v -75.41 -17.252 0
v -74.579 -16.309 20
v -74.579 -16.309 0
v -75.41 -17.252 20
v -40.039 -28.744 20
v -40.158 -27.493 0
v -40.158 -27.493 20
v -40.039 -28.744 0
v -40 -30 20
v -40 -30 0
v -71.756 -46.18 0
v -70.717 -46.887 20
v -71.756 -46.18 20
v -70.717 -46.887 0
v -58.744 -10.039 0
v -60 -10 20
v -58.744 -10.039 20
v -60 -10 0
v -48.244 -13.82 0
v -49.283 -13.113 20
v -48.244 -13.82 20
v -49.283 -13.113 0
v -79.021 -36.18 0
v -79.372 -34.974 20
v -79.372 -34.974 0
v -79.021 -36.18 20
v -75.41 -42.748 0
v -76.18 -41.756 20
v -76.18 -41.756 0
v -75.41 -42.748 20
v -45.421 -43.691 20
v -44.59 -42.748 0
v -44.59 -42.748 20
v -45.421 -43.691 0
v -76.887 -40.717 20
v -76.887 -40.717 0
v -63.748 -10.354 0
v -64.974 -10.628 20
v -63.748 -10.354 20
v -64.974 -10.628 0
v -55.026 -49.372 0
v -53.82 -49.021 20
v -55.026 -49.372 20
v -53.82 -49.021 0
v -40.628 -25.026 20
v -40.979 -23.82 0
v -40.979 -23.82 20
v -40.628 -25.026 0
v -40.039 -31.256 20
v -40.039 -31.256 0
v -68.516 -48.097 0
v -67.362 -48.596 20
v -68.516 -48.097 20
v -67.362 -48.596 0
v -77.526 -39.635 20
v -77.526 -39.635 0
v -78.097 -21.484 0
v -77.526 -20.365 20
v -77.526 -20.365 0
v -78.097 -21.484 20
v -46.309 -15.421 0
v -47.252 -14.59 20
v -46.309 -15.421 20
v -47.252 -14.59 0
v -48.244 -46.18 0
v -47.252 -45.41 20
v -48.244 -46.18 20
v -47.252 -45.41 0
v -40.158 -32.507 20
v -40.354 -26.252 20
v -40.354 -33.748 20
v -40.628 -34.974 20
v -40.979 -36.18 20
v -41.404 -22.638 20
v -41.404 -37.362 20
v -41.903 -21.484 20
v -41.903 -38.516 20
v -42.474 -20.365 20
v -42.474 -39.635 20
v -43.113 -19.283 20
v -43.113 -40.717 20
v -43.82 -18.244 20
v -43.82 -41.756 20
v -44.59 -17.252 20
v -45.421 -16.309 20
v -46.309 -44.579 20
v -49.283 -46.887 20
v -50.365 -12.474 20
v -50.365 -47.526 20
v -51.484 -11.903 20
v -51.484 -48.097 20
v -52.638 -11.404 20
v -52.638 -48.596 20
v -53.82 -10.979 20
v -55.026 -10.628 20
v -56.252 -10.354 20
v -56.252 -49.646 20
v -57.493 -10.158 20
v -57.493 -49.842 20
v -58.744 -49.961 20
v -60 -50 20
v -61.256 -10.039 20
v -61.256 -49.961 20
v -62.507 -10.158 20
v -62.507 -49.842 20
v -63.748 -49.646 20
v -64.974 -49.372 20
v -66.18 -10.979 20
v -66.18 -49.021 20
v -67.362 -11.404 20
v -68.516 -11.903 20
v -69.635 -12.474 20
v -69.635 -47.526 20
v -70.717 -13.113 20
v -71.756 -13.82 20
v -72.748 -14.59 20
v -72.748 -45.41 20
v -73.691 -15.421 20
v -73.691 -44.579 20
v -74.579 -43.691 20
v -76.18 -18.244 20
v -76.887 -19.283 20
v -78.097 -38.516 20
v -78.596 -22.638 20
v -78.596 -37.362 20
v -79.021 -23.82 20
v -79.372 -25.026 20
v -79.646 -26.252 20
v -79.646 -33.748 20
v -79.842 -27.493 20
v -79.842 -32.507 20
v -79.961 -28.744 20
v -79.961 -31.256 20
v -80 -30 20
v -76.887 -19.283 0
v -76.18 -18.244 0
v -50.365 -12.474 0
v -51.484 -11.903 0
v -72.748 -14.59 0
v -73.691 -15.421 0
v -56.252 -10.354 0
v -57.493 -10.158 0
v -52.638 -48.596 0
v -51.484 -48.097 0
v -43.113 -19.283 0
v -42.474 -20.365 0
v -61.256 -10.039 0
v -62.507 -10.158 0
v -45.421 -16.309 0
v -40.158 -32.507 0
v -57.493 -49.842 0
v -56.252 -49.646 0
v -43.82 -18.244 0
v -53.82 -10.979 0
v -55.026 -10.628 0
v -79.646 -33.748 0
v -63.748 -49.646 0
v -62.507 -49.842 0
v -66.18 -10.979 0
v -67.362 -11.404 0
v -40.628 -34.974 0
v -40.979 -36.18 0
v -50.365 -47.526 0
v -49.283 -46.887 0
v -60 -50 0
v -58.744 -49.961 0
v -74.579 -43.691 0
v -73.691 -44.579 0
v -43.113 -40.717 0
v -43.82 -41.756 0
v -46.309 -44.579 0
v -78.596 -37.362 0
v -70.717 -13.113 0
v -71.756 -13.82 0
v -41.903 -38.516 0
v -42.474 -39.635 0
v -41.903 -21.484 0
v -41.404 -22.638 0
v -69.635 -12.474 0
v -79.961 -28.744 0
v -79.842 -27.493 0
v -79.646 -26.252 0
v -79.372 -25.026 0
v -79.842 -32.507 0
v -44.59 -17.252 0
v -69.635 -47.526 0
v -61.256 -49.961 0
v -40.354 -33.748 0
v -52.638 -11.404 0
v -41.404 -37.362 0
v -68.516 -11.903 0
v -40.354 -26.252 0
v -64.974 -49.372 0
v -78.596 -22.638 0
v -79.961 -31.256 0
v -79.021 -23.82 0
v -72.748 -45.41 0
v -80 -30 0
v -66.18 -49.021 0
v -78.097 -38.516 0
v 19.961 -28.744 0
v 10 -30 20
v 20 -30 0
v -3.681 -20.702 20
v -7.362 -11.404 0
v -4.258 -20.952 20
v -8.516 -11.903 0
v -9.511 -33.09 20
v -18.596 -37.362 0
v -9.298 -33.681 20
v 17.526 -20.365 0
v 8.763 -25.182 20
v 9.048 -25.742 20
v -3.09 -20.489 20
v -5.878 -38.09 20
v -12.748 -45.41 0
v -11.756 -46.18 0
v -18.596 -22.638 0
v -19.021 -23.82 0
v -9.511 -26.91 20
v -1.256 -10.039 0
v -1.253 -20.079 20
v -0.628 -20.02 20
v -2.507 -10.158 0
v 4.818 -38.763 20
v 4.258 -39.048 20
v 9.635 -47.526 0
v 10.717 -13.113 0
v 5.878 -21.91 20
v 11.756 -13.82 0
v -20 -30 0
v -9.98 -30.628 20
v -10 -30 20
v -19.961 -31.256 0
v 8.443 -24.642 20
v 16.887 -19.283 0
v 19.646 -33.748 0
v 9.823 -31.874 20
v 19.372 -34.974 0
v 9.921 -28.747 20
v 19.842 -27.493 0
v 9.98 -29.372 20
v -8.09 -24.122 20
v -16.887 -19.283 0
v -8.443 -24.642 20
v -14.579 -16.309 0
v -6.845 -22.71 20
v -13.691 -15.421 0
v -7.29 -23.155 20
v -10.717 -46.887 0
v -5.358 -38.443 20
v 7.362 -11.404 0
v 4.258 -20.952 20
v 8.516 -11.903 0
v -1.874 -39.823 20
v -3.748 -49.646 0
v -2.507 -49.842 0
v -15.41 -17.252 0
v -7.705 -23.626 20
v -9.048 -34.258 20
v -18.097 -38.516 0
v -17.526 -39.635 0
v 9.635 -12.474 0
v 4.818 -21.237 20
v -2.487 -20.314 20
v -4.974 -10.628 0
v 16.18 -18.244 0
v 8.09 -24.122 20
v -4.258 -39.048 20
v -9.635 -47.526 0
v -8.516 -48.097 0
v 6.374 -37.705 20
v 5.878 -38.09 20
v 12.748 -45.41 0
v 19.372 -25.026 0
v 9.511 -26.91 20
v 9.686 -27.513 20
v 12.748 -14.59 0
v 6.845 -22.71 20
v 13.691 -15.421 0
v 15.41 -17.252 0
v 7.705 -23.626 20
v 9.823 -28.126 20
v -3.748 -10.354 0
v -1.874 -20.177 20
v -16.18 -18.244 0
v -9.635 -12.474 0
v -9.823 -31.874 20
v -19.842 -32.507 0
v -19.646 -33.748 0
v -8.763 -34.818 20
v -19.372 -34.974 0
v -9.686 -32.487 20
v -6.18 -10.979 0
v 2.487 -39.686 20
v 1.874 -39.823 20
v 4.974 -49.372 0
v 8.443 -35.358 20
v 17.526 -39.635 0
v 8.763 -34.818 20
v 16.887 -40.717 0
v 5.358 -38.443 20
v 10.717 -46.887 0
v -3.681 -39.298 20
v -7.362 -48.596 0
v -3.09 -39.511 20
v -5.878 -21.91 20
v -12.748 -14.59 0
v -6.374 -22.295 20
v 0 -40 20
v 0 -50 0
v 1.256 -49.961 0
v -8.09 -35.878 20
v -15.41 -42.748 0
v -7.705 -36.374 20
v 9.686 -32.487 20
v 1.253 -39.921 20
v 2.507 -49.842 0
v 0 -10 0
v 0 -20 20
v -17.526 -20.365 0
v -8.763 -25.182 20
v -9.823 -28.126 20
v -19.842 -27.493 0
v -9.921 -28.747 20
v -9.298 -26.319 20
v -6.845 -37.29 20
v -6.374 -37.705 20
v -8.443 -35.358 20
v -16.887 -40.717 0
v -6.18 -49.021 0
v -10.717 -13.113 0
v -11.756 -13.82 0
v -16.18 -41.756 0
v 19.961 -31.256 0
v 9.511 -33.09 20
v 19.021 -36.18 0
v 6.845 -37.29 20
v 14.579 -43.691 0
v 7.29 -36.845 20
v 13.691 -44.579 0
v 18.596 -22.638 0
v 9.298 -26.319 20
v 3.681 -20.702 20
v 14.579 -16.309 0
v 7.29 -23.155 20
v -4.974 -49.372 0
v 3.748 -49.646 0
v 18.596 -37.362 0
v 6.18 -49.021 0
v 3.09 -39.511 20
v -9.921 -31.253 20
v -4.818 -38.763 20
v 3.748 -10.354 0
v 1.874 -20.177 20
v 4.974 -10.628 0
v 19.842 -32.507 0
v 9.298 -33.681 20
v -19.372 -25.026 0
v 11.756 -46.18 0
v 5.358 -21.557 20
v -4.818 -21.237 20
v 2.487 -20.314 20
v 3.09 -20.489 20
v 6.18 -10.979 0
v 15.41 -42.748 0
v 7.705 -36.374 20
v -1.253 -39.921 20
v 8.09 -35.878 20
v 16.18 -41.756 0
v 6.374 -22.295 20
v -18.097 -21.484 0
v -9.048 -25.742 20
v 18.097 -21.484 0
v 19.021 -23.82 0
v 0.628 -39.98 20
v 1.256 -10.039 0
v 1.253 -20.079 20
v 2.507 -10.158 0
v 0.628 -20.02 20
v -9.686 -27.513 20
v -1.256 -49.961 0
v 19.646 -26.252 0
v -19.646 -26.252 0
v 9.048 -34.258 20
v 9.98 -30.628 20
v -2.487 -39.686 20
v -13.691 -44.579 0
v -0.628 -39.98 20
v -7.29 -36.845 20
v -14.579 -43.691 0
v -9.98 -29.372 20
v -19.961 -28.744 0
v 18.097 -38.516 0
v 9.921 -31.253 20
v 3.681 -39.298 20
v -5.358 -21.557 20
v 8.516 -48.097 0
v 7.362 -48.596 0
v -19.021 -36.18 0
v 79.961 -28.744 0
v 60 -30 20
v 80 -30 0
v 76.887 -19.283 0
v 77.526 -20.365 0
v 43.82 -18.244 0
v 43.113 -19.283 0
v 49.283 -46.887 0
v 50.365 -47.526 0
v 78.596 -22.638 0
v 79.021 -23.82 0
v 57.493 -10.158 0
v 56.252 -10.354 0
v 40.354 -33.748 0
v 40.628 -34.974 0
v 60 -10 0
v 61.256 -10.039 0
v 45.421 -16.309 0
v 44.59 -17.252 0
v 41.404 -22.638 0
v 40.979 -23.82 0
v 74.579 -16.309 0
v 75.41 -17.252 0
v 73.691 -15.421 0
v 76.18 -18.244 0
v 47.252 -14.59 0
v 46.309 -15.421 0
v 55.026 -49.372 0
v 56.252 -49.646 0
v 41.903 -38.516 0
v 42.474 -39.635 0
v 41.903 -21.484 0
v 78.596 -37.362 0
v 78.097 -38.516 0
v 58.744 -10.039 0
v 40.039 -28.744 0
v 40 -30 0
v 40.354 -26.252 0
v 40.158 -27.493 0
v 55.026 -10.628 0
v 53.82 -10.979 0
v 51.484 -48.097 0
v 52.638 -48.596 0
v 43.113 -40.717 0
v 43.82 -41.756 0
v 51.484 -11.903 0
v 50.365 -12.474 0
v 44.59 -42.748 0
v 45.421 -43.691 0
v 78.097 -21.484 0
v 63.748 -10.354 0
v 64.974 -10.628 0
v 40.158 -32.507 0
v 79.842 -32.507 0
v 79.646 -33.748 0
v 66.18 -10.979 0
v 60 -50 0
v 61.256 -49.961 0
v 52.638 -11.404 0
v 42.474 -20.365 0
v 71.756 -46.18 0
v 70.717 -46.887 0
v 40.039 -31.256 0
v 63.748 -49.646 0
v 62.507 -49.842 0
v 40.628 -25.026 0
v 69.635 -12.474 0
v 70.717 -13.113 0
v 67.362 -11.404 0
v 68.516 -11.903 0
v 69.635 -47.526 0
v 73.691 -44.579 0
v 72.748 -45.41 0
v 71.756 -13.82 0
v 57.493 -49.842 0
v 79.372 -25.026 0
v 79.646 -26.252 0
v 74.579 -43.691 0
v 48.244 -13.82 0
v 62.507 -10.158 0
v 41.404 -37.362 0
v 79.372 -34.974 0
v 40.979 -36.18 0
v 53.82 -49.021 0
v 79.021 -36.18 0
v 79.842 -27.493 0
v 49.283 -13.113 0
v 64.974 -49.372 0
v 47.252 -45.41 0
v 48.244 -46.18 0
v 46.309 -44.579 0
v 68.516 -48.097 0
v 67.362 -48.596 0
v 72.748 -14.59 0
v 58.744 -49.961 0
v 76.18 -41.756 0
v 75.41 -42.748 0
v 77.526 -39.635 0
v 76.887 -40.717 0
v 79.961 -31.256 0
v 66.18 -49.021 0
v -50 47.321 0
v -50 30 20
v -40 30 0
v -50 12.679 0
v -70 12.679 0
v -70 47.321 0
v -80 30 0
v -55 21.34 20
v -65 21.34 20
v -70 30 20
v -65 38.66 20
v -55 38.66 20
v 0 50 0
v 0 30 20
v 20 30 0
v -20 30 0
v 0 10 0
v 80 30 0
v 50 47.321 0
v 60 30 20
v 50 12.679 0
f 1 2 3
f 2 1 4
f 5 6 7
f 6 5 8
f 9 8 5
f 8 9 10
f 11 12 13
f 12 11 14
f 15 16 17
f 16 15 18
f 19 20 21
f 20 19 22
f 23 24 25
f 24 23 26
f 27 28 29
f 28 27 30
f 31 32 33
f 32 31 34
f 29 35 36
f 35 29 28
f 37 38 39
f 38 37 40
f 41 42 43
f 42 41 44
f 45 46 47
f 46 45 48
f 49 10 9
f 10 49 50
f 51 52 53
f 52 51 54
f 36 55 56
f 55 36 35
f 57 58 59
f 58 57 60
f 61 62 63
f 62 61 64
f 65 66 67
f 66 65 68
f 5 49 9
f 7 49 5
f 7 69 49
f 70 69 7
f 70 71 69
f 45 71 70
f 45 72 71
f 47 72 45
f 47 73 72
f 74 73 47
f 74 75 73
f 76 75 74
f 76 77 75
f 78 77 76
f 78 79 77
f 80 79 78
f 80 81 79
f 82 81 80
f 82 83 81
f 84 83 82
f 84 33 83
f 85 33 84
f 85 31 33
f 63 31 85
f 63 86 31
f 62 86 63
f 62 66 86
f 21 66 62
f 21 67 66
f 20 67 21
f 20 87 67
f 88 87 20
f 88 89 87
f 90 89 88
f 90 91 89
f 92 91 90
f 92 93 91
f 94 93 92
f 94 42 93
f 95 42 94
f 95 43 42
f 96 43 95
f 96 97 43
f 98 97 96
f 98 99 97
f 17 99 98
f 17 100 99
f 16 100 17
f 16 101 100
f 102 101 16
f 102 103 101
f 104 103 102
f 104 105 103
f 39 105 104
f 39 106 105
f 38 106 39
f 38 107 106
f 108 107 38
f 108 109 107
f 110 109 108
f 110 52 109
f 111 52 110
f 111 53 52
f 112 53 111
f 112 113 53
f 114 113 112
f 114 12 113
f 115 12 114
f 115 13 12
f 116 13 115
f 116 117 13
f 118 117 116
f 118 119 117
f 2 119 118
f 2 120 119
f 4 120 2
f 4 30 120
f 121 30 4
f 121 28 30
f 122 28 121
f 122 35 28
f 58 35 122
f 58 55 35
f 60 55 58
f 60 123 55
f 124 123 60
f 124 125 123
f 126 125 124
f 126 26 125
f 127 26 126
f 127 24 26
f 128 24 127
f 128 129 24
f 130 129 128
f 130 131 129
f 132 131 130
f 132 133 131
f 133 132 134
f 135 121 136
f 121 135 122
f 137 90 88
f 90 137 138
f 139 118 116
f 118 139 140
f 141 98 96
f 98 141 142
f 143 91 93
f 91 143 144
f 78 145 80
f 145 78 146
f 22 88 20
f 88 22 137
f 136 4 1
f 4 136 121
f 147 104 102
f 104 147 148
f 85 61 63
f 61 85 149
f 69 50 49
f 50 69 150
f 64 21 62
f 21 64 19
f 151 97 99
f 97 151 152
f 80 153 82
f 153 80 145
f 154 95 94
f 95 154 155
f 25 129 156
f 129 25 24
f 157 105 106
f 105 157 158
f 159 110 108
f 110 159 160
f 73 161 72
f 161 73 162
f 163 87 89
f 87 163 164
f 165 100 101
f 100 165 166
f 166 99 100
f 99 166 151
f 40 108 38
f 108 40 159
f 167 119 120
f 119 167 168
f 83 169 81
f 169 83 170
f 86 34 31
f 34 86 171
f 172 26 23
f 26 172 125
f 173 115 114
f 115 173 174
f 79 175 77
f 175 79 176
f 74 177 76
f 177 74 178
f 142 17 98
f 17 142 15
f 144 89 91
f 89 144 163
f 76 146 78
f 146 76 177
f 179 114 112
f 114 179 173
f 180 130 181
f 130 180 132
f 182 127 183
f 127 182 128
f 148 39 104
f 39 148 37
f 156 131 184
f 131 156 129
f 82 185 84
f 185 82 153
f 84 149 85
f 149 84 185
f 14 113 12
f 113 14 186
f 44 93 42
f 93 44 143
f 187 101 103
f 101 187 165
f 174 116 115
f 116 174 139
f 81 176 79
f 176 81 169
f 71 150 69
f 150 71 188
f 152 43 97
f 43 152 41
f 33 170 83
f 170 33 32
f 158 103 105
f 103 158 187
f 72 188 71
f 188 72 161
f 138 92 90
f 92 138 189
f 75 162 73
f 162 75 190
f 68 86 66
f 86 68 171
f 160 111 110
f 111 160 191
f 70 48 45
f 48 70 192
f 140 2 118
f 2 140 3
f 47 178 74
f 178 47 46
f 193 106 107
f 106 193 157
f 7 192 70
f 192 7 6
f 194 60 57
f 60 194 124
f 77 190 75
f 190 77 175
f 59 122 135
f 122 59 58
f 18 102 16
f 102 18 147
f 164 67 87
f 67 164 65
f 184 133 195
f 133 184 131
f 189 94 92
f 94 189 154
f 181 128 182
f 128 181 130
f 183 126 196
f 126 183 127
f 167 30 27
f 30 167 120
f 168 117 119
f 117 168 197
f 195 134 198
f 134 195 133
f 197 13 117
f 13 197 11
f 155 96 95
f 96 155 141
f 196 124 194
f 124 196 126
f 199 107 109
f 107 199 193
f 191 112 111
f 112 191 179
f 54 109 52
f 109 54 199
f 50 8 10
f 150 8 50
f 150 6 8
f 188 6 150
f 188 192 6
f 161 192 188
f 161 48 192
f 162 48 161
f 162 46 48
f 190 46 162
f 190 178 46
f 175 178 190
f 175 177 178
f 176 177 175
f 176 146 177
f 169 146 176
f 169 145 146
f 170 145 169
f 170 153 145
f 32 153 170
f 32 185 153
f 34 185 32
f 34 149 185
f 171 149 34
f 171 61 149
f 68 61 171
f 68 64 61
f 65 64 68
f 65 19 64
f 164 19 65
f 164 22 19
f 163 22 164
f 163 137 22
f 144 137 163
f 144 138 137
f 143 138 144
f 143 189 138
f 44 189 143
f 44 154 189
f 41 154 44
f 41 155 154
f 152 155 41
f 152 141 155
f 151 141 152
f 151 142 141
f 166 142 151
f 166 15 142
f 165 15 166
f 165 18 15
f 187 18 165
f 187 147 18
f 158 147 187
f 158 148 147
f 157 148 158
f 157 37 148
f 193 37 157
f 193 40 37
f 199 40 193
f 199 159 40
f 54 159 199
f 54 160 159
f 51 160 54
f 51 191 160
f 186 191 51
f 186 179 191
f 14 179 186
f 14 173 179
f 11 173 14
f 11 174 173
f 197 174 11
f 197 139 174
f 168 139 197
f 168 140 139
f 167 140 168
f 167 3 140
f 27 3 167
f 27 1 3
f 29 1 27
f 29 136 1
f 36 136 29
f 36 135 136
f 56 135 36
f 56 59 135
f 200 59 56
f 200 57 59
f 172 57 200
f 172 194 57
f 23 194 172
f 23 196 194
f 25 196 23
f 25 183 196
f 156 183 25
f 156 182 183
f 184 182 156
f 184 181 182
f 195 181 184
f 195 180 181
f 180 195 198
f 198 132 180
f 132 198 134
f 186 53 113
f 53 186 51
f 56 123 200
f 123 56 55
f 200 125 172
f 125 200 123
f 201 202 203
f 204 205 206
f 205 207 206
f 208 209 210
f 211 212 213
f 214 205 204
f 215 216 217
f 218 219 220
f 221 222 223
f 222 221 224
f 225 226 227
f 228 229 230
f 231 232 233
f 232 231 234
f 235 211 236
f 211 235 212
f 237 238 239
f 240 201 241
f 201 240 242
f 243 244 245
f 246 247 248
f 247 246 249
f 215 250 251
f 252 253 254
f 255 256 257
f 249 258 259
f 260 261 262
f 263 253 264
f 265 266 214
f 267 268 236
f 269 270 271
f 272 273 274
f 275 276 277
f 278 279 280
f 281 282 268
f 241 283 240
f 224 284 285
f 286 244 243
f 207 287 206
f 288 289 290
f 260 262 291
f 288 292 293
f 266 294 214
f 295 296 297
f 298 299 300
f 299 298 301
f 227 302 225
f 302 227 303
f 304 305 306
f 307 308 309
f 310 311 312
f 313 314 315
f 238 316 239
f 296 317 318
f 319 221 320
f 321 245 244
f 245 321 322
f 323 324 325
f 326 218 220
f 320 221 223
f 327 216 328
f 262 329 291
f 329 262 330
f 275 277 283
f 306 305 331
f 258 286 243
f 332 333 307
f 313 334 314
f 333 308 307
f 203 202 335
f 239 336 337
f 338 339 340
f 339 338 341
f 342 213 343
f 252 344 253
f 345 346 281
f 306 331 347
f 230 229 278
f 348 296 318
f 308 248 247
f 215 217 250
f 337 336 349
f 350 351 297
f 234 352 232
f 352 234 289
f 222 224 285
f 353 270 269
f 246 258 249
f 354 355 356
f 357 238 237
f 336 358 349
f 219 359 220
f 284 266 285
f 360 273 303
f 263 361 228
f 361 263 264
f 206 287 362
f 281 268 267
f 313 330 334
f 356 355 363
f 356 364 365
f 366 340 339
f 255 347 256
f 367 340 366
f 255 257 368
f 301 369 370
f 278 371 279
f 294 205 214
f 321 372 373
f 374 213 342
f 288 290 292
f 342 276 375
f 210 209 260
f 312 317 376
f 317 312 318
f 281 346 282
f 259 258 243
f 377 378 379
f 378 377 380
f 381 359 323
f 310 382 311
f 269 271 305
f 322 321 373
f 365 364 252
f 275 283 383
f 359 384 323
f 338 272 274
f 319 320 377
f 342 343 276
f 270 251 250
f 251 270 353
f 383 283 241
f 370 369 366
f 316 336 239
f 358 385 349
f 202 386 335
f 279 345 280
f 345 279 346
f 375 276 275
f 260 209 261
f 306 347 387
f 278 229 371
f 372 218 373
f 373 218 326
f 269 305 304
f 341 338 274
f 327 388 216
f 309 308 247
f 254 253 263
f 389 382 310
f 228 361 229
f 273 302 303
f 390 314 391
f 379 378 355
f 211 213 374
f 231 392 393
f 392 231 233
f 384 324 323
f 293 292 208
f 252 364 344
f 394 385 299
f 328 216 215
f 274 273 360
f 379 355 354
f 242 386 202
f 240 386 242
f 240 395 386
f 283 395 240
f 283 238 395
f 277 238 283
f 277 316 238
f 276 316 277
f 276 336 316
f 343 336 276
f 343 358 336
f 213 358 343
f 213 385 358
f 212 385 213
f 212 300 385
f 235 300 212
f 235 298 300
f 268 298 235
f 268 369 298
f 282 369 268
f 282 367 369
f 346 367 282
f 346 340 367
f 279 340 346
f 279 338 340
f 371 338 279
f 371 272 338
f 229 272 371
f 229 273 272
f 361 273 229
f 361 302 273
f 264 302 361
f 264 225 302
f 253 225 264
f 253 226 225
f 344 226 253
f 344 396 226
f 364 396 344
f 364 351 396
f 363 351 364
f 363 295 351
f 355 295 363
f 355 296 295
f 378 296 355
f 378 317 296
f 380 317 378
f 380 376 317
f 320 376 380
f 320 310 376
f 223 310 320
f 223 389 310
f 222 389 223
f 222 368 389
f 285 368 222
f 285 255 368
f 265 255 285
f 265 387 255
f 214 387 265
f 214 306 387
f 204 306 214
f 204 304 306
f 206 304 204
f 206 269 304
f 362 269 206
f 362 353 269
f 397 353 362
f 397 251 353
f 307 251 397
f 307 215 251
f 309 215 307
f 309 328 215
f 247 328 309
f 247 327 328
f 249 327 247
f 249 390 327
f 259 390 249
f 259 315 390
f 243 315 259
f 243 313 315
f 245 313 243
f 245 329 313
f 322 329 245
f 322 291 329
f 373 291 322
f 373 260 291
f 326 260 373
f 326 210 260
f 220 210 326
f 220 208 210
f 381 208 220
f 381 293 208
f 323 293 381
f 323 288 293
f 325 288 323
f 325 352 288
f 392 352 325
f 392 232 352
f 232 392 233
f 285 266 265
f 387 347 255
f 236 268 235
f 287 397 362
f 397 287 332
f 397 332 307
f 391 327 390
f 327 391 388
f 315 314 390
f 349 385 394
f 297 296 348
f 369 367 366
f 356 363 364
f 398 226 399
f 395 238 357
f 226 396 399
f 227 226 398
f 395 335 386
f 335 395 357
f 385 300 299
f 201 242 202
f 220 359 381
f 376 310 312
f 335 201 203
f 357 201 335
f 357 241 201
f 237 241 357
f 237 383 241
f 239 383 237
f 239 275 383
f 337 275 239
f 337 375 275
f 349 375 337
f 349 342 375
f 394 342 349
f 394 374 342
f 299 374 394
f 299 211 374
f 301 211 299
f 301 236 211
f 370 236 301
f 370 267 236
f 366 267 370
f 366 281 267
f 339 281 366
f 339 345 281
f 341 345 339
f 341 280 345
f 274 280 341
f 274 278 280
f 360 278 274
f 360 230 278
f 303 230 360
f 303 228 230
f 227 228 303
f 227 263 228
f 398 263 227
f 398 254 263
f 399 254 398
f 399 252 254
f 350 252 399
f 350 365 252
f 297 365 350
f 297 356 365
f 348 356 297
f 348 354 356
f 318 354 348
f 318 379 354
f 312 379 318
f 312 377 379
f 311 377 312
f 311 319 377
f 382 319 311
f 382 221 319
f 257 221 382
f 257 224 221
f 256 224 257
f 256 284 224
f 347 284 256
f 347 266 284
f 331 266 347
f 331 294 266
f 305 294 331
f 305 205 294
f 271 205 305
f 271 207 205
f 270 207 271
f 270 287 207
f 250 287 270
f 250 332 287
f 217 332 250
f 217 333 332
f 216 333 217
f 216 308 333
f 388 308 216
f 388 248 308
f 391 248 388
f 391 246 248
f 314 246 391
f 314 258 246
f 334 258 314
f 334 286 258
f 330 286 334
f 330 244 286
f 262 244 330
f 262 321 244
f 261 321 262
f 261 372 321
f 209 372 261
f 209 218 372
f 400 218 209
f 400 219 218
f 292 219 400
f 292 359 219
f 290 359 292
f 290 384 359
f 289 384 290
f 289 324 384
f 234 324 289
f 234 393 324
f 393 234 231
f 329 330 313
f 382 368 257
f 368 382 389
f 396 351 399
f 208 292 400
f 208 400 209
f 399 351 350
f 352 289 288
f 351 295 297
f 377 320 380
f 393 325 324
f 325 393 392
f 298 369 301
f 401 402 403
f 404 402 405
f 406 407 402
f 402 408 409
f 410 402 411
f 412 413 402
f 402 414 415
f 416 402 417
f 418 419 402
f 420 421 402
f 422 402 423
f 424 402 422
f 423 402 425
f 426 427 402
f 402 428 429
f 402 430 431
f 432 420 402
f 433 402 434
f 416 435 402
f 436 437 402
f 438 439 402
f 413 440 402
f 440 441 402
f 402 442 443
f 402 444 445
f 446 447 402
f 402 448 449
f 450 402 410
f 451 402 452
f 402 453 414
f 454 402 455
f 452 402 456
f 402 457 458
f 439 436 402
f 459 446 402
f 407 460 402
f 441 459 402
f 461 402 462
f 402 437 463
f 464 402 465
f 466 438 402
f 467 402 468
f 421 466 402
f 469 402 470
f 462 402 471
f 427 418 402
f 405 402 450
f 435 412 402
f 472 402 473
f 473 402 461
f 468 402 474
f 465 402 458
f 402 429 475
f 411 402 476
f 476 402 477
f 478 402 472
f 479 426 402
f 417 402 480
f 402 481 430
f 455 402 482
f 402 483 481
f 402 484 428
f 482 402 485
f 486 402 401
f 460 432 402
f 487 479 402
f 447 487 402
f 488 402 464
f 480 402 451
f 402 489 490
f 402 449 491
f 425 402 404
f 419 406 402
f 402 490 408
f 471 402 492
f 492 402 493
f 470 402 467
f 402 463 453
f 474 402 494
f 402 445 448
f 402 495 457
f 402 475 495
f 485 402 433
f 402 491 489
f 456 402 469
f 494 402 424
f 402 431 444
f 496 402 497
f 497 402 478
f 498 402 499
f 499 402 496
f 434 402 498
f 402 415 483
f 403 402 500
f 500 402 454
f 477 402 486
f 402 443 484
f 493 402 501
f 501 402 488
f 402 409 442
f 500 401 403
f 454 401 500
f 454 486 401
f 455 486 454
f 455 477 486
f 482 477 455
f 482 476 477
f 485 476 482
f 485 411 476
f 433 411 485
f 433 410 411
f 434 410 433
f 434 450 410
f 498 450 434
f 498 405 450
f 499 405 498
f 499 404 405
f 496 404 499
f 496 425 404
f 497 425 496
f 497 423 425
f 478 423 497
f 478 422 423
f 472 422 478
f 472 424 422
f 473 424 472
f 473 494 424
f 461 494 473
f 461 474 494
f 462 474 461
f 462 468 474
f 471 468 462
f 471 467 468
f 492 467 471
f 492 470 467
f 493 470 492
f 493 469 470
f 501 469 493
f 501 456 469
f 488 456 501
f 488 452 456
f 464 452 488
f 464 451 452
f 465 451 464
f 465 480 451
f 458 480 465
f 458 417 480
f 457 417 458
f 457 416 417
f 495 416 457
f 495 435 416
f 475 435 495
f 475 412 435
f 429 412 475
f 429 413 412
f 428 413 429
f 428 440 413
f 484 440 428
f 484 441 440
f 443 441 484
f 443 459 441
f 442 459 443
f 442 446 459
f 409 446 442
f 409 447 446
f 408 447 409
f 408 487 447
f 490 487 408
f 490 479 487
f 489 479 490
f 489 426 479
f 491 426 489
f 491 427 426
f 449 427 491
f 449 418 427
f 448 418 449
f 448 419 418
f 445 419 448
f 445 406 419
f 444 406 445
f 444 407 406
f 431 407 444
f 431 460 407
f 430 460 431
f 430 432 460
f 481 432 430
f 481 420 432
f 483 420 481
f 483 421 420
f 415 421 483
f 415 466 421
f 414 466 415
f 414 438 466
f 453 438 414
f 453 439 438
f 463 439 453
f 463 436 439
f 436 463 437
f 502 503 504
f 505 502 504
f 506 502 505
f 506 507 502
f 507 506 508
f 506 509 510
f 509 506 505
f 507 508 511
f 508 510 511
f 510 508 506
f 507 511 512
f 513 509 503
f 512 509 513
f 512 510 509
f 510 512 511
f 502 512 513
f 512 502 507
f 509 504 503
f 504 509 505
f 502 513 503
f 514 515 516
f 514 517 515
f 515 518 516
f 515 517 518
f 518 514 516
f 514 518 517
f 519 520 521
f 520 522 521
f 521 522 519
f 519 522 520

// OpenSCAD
//-- Dimensiones de los cuadros de la cuadrícula
d=60;

//-- Centrar la cuadrícula
translate([-2*d/2,-d/2,0]){

    //-- Punto: 0,0
    translate([0,0,0]) cylinder(r=20,h=20,$fn=100);

    //-- Punto: 1,0
    translate([d,0,0]) cylinder(r1=20,r2=10,h=20,$fn=100);

    //-- Punto: 2,0
    translate([2*d,0,0]) cylinder(r1=20,r2=0,h=20,$fn=100);

    //-- Punto: 0,1
    translate([0,d,0]) cylinder(r1=20,r2=10,h=20,$fn=6);

    //-- Punto: 1,1
    translate([d,d,0]) cylinder(r1=20,r2=0,h=20,$fn=4);

    //-- Punto: 2,1
    translate([2*d,d,0]) cylinder(r1=20,r2=0,h=20,$fn=3);

}
